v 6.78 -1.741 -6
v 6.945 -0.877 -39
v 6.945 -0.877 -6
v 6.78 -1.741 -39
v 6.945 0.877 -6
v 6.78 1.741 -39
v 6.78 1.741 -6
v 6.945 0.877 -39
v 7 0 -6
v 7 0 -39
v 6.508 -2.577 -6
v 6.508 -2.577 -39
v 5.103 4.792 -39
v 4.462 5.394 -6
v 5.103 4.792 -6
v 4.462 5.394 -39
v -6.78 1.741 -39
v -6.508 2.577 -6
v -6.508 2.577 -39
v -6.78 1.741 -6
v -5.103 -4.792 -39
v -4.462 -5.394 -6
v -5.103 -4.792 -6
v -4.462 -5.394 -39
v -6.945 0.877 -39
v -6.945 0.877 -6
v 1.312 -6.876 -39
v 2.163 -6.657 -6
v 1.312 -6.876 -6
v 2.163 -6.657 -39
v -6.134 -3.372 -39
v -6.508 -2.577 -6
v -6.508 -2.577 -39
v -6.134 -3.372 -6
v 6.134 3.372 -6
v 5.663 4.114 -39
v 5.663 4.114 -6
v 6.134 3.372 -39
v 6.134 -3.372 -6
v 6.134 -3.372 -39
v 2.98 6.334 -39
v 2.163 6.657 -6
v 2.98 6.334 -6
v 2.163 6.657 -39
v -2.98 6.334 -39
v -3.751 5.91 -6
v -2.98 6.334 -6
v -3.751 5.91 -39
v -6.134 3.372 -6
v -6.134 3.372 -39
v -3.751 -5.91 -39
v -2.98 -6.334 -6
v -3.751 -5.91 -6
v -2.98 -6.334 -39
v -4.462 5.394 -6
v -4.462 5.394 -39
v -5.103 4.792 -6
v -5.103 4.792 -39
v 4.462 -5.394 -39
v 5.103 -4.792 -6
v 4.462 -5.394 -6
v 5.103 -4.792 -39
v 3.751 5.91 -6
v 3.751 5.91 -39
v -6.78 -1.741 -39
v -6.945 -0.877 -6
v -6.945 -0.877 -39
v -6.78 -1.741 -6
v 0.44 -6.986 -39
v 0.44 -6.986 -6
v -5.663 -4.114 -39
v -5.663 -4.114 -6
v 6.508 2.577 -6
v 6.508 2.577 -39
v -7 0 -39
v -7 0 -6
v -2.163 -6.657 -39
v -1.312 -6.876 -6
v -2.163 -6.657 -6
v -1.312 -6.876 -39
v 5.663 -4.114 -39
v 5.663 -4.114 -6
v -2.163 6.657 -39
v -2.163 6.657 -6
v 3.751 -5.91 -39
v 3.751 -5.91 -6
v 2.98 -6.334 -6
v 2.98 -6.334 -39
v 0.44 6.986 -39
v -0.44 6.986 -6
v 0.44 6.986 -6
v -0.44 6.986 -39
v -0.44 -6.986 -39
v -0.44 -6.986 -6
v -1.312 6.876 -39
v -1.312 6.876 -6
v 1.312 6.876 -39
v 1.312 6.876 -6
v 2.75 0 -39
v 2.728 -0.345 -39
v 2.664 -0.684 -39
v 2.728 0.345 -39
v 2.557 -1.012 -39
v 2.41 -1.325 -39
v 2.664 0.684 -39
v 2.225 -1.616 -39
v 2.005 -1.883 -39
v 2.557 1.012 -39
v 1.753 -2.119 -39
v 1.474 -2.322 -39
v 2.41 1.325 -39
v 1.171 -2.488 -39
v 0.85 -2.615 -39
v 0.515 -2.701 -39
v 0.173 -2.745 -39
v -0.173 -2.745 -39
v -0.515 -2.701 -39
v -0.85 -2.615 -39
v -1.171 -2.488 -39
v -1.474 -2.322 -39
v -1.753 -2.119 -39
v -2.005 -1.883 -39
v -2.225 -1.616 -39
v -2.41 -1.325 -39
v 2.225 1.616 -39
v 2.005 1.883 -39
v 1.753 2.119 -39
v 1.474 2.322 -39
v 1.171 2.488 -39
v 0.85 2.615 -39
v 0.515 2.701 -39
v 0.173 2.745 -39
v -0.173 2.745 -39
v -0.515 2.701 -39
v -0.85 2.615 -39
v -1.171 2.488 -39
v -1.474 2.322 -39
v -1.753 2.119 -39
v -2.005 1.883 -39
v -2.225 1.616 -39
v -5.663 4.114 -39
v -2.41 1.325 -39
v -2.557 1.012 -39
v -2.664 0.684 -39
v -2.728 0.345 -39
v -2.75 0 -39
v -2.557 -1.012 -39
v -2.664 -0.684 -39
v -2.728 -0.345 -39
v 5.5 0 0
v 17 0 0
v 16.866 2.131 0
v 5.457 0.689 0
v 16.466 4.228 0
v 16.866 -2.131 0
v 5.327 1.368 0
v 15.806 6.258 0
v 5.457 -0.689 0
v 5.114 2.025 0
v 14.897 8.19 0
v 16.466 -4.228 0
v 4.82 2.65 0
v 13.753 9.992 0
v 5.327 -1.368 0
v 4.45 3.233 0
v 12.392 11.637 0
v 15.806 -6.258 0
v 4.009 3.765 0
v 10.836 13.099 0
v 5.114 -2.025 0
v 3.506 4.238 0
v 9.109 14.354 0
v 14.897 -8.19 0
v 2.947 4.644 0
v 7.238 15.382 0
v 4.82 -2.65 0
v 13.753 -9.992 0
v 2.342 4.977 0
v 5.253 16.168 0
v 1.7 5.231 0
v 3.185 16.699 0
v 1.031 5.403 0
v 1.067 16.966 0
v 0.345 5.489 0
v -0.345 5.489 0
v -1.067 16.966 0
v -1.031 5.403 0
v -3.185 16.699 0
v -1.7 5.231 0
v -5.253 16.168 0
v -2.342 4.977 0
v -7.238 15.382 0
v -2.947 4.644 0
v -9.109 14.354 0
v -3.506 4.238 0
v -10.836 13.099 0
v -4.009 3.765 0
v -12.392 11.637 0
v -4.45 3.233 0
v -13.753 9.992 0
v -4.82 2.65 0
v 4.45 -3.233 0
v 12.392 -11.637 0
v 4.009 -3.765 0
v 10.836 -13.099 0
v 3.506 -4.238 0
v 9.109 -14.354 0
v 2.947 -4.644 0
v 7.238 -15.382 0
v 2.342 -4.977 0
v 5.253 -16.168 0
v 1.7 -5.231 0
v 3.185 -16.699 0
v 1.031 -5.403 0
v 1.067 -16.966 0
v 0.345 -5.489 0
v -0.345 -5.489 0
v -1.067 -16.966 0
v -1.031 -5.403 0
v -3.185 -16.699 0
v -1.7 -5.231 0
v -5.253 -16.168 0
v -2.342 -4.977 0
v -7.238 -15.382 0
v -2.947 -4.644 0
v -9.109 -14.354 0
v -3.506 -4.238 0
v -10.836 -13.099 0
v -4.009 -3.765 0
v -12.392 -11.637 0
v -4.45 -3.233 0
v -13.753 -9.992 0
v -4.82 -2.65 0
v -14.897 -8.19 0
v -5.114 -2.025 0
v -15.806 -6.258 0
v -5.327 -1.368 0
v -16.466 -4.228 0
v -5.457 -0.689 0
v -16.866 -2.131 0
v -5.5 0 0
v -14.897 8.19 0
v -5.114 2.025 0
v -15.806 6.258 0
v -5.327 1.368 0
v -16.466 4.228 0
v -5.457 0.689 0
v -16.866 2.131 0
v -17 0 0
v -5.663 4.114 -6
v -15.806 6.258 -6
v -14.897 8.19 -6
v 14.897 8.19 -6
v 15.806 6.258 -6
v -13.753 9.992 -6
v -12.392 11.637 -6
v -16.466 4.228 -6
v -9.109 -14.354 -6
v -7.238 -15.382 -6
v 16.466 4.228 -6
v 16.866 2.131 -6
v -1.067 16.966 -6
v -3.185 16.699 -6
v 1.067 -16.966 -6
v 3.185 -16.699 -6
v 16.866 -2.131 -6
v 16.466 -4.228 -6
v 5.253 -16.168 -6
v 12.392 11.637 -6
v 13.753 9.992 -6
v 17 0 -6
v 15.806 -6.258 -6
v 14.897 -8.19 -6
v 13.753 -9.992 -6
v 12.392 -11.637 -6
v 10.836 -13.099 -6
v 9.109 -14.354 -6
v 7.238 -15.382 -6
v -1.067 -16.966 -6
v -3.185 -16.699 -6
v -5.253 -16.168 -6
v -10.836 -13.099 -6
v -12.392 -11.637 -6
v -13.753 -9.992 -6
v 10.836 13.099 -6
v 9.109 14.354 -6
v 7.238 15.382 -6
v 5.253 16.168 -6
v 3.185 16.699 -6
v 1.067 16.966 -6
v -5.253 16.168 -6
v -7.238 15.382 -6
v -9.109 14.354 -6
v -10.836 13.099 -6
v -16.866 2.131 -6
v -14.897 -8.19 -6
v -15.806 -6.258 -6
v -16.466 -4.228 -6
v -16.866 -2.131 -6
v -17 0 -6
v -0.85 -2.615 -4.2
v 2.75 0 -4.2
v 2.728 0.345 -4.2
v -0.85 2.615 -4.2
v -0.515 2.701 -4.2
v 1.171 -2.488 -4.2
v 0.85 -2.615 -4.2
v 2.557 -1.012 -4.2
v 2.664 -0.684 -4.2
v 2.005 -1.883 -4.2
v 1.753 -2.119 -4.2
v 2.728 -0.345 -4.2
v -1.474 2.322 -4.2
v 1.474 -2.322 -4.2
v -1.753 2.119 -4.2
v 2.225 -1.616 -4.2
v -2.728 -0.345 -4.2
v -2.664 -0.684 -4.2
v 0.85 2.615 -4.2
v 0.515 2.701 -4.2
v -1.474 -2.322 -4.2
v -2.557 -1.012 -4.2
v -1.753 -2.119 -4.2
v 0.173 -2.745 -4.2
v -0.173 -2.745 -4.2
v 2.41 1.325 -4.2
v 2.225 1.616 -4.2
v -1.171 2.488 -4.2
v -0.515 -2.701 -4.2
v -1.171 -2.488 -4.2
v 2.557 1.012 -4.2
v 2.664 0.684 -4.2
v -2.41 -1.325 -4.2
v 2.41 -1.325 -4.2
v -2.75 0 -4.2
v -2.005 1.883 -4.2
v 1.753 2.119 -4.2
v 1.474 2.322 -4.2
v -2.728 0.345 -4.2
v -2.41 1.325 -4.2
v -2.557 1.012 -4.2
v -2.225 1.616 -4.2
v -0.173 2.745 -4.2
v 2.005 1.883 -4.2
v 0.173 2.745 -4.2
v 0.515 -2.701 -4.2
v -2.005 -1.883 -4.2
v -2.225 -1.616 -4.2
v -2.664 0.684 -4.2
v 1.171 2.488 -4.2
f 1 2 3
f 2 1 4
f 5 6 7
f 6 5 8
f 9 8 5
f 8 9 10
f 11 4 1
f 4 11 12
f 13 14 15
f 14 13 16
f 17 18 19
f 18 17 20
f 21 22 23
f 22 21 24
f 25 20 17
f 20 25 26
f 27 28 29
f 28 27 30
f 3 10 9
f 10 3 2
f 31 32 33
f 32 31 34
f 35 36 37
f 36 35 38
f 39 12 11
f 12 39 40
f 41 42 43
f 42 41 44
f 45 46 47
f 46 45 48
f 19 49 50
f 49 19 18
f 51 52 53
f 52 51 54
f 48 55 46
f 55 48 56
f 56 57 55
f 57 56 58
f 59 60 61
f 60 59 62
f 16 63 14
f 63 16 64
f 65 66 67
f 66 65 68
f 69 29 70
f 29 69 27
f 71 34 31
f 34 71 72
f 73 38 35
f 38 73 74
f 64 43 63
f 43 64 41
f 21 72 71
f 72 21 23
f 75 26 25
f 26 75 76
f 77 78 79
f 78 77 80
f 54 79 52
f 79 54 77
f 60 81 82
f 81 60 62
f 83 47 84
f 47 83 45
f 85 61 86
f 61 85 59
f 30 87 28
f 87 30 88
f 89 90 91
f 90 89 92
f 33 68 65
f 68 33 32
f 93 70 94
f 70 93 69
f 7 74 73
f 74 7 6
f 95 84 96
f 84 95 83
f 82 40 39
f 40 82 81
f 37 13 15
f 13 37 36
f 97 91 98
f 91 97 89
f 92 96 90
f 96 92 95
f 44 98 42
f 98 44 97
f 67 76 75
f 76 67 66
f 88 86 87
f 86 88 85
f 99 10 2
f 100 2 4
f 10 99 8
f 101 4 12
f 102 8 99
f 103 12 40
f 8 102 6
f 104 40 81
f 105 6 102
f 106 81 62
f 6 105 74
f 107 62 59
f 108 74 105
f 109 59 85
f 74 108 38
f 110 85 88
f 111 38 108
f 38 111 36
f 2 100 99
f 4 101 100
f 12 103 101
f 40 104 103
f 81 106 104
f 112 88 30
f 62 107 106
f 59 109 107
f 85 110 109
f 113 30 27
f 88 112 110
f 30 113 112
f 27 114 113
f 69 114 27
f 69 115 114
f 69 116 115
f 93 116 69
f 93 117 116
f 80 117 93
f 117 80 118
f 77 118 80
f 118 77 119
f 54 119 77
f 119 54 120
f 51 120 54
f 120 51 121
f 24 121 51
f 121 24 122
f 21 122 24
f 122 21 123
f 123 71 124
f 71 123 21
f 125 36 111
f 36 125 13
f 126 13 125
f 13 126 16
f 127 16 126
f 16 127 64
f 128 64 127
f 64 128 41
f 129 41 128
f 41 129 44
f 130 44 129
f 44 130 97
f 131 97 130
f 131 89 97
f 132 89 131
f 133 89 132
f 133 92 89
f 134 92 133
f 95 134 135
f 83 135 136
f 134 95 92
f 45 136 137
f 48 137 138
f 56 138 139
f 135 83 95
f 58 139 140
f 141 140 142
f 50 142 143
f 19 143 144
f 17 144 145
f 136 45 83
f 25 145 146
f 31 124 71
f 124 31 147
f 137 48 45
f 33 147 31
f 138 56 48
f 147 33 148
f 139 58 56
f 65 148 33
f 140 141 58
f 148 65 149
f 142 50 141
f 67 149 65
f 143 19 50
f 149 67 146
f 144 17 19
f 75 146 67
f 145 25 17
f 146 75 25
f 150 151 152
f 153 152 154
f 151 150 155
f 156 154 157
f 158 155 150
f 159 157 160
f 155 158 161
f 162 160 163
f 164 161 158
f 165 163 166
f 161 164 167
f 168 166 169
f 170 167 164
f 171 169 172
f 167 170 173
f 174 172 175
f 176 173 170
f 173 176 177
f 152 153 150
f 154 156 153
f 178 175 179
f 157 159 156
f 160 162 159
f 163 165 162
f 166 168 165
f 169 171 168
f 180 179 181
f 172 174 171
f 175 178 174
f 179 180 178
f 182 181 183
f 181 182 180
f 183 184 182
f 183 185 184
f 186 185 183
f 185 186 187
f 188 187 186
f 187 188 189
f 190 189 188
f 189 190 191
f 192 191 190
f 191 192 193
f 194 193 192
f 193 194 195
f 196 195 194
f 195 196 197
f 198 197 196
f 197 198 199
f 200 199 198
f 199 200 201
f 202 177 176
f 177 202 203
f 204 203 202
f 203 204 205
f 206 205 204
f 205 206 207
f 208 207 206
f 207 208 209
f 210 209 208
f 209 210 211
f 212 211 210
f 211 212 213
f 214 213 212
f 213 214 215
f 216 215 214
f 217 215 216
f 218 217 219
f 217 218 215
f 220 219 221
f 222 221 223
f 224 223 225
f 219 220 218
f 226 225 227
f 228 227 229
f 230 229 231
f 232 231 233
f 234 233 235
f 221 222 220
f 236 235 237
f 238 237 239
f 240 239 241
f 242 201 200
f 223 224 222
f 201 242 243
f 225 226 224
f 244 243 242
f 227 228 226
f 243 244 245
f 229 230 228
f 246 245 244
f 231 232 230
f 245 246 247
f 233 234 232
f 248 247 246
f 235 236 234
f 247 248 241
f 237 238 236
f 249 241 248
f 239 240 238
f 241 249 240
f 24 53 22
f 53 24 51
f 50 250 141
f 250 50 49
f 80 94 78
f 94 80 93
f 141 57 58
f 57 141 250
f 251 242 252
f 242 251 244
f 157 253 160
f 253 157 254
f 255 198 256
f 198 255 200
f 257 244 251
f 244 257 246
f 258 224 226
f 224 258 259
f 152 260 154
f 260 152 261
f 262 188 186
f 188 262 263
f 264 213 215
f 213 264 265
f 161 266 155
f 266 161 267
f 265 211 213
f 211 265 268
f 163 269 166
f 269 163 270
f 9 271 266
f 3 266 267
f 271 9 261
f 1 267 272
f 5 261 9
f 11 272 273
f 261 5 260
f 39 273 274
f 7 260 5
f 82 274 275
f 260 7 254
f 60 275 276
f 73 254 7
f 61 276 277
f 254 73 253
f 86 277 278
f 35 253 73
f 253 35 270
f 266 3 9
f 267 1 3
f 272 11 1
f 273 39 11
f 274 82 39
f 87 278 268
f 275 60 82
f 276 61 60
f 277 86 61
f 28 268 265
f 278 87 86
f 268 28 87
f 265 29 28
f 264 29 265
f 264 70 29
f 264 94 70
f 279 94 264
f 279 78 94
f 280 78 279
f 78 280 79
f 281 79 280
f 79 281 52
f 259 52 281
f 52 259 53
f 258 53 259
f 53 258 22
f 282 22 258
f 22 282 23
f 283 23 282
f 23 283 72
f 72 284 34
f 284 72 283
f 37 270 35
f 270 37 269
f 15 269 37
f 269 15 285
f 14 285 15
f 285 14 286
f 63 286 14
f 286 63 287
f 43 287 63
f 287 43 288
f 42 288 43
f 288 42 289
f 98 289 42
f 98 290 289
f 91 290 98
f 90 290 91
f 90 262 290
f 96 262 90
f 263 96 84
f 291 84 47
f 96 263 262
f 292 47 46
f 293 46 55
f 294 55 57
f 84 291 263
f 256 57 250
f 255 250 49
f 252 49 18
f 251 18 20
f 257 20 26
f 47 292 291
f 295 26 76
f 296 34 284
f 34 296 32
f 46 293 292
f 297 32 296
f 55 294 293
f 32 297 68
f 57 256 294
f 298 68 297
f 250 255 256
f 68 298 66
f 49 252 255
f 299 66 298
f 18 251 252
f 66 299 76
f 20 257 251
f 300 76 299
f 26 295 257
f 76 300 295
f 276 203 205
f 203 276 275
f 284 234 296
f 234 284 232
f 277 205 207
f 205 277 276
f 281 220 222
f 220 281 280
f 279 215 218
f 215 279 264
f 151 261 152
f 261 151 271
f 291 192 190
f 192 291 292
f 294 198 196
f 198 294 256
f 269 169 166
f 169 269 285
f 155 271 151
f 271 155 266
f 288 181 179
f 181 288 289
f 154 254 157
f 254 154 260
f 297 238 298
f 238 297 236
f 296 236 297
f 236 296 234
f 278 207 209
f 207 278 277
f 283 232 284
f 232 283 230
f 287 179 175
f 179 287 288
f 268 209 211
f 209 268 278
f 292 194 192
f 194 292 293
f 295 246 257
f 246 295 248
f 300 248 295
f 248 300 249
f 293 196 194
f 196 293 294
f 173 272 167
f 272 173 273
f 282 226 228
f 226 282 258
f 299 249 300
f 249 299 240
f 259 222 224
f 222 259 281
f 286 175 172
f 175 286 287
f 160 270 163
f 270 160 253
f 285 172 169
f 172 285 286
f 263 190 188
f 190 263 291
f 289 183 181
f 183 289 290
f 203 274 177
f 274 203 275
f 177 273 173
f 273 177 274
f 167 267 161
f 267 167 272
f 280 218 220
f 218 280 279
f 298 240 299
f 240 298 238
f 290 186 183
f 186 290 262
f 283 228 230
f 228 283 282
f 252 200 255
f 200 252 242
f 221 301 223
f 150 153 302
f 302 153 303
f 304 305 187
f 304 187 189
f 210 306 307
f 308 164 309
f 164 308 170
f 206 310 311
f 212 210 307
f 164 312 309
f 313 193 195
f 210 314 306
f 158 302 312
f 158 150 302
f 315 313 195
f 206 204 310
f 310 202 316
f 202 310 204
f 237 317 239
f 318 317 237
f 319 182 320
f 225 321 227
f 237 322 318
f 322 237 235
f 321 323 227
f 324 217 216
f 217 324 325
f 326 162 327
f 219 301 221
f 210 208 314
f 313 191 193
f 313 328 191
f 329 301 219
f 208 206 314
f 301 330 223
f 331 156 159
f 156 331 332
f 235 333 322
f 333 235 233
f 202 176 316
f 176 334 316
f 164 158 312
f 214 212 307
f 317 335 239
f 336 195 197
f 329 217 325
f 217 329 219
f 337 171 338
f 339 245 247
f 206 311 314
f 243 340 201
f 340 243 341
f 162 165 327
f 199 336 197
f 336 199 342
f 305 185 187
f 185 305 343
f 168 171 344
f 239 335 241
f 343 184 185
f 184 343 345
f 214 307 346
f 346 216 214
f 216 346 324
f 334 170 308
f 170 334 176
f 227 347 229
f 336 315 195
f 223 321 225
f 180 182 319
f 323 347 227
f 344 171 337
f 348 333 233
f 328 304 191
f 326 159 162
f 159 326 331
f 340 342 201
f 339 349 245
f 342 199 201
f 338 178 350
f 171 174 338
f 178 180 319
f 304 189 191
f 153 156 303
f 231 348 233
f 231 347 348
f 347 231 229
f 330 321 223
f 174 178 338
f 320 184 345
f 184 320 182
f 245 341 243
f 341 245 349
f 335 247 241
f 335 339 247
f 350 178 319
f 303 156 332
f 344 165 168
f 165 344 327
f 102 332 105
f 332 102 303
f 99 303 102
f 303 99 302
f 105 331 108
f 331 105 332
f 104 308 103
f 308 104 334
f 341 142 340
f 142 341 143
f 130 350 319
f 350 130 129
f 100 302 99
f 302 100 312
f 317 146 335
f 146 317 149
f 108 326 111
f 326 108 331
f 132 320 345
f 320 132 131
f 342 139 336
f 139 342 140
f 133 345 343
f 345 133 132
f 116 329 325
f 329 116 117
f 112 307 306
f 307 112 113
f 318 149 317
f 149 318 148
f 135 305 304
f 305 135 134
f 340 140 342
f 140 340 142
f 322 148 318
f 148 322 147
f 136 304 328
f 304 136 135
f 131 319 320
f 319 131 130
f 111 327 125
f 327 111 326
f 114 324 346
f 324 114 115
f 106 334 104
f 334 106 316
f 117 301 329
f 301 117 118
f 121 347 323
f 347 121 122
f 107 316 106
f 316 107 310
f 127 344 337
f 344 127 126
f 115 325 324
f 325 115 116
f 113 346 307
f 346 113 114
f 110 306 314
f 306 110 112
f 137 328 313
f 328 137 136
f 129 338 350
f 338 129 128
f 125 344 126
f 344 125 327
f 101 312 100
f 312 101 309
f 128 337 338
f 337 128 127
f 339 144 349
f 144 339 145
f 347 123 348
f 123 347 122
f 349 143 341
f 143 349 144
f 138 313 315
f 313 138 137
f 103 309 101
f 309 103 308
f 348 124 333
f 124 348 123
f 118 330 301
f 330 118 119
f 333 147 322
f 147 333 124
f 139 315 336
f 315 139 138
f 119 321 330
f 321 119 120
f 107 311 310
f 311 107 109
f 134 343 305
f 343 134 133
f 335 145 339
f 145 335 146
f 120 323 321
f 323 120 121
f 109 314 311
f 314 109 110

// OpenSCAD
$fn = 50;


difference() {
	union() {
		translate(v = [0, 0, -39.0000000000]) {
			cylinder(h = 39, r = 7.0000000000);
		}
		translate(v = [0, 0, -6.0000000000]) {
			cylinder(h = 6, r = 17.0000000000);
		}
	}
	union() {
		translate(v = [0, 0, 0]) {
			rotate(a = [0, 0, 0]) {
				difference() {
					union() {
						#translate(v = [0, 0, -39.0000000000]) {
							cylinder(h = 39, r = 2.2500000000);
						}
						#translate(v = [0, 0, -4.2000000000]) {
							cylinder(h = 4.2000000000, r = 7.0000000000, r1 = 2.7500000000, r2 = 5.5000000000);
						}
						#translate(v = [0, 0, -39.0000000000]) {
							cylinder(h = 39, r = 2.7500000000);
						}
						#translate(v = [0, 0, -39.0000000000]) {
							cylinder(h = 39, r = 2.2500000000);
						}
					}
					union();
				}
			}
		}
	}
}
